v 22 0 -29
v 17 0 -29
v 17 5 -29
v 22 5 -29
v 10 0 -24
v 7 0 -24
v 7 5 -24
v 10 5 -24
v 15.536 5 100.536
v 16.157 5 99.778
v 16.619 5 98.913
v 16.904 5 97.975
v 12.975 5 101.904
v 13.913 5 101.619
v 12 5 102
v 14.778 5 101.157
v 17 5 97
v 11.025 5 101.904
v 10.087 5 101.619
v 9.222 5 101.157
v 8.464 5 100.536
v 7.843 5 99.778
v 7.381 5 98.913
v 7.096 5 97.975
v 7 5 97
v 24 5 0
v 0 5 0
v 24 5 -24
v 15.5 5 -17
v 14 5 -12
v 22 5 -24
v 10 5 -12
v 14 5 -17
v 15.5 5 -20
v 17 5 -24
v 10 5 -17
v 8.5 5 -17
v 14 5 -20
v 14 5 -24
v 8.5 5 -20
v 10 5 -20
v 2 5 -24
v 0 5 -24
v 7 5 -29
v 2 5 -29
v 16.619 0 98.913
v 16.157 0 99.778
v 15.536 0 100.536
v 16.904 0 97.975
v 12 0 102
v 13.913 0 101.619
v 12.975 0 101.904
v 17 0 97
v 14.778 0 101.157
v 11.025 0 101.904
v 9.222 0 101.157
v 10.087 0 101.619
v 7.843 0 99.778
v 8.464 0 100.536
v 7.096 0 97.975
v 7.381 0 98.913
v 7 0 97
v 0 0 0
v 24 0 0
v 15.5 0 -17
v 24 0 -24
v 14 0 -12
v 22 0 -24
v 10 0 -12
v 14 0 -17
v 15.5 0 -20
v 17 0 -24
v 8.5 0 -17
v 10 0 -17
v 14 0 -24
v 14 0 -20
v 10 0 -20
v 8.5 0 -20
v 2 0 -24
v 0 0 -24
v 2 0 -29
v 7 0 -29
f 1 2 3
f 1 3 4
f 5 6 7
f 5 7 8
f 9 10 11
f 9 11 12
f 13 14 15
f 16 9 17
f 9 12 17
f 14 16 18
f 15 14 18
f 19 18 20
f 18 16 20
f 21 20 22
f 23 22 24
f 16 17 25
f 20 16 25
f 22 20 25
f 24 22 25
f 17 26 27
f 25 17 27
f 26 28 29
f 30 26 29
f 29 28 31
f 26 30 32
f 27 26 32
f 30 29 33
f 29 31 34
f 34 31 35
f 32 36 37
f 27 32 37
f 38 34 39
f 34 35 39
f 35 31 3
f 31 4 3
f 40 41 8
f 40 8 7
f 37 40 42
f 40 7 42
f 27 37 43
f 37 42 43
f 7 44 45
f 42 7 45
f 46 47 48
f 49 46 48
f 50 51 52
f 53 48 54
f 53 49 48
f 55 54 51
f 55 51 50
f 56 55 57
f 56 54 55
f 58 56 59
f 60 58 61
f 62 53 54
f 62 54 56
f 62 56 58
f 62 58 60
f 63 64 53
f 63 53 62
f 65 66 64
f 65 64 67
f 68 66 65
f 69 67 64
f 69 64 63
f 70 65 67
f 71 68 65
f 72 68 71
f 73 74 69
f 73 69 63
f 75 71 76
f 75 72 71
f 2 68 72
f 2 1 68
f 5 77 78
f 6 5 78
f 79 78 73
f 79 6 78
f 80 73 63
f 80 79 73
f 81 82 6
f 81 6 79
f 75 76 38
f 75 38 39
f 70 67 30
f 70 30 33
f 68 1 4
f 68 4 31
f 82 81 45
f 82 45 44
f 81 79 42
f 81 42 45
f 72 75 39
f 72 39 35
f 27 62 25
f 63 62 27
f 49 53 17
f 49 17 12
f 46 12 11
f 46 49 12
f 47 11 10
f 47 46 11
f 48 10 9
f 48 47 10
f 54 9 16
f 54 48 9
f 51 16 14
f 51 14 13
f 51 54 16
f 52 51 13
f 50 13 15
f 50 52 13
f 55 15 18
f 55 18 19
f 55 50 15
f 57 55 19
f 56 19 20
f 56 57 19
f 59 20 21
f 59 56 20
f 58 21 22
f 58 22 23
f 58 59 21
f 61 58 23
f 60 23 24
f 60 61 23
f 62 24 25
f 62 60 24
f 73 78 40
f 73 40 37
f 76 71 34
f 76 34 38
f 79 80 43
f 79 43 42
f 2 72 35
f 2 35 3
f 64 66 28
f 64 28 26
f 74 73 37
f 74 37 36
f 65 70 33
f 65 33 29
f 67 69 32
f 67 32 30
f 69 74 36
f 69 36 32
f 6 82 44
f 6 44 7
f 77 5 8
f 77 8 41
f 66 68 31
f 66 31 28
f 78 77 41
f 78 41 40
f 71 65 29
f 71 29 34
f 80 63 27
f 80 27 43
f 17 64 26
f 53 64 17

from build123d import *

# Parameters (mm, degrees)
BOSS_EXTRUDE1_DEPTH = 5


with BuildPart() as part:
    # Sketch1 → Boss-Extrude1 (new body)
    with BuildSketch(Plane(origin=(0, 0, 0), x_dir=(1, 0, 0), z_dir=(0, 1, 0))):
        with BuildLine():
            Line((0, 0), (0, 24))
            Line((0, 24), (2, 24))
            Line((2, 24), (2, 29))
            Line((2, 29), (7, 29))
            Line((7, 29), (7, 24))
            Line((7, 24), (10, 24))
            Line((10, 24), (10, 20))
            Line((10, 20), (8.5, 20))
            Line((8.5, 20), (8.5, 17))
            Line((8.5, 17), (10, 17))
            Line((10, 17), (10, 12))
            Line((10, 12), (14, 12))
            Line((14, 12), (14, 17))
            Line((14, 17), (15.5, 17))
            Line((15.5, 17), (15.5, 20))
            Line((15.5, 20), (14, 20))
            Line((14, 20), (14, 24))
            Line((14, 24), (17, 24))
            Line((17, 24), (17, 29))
            Line((17, 29), (22, 29))
            Line((22, 29), (22, 24))
            Line((22, 24), (24, 24))
            Line((24, 24), (24, 0))
            Line((24, 0), (17, -97))
            ThreePointArc((17, -97), (12, -102), (7, -97))
            Line((7, -97), (0, 0))
        make_face()
    extrude(amount=BOSS_EXTRUDE1_DEPTH)


solid = part.part
